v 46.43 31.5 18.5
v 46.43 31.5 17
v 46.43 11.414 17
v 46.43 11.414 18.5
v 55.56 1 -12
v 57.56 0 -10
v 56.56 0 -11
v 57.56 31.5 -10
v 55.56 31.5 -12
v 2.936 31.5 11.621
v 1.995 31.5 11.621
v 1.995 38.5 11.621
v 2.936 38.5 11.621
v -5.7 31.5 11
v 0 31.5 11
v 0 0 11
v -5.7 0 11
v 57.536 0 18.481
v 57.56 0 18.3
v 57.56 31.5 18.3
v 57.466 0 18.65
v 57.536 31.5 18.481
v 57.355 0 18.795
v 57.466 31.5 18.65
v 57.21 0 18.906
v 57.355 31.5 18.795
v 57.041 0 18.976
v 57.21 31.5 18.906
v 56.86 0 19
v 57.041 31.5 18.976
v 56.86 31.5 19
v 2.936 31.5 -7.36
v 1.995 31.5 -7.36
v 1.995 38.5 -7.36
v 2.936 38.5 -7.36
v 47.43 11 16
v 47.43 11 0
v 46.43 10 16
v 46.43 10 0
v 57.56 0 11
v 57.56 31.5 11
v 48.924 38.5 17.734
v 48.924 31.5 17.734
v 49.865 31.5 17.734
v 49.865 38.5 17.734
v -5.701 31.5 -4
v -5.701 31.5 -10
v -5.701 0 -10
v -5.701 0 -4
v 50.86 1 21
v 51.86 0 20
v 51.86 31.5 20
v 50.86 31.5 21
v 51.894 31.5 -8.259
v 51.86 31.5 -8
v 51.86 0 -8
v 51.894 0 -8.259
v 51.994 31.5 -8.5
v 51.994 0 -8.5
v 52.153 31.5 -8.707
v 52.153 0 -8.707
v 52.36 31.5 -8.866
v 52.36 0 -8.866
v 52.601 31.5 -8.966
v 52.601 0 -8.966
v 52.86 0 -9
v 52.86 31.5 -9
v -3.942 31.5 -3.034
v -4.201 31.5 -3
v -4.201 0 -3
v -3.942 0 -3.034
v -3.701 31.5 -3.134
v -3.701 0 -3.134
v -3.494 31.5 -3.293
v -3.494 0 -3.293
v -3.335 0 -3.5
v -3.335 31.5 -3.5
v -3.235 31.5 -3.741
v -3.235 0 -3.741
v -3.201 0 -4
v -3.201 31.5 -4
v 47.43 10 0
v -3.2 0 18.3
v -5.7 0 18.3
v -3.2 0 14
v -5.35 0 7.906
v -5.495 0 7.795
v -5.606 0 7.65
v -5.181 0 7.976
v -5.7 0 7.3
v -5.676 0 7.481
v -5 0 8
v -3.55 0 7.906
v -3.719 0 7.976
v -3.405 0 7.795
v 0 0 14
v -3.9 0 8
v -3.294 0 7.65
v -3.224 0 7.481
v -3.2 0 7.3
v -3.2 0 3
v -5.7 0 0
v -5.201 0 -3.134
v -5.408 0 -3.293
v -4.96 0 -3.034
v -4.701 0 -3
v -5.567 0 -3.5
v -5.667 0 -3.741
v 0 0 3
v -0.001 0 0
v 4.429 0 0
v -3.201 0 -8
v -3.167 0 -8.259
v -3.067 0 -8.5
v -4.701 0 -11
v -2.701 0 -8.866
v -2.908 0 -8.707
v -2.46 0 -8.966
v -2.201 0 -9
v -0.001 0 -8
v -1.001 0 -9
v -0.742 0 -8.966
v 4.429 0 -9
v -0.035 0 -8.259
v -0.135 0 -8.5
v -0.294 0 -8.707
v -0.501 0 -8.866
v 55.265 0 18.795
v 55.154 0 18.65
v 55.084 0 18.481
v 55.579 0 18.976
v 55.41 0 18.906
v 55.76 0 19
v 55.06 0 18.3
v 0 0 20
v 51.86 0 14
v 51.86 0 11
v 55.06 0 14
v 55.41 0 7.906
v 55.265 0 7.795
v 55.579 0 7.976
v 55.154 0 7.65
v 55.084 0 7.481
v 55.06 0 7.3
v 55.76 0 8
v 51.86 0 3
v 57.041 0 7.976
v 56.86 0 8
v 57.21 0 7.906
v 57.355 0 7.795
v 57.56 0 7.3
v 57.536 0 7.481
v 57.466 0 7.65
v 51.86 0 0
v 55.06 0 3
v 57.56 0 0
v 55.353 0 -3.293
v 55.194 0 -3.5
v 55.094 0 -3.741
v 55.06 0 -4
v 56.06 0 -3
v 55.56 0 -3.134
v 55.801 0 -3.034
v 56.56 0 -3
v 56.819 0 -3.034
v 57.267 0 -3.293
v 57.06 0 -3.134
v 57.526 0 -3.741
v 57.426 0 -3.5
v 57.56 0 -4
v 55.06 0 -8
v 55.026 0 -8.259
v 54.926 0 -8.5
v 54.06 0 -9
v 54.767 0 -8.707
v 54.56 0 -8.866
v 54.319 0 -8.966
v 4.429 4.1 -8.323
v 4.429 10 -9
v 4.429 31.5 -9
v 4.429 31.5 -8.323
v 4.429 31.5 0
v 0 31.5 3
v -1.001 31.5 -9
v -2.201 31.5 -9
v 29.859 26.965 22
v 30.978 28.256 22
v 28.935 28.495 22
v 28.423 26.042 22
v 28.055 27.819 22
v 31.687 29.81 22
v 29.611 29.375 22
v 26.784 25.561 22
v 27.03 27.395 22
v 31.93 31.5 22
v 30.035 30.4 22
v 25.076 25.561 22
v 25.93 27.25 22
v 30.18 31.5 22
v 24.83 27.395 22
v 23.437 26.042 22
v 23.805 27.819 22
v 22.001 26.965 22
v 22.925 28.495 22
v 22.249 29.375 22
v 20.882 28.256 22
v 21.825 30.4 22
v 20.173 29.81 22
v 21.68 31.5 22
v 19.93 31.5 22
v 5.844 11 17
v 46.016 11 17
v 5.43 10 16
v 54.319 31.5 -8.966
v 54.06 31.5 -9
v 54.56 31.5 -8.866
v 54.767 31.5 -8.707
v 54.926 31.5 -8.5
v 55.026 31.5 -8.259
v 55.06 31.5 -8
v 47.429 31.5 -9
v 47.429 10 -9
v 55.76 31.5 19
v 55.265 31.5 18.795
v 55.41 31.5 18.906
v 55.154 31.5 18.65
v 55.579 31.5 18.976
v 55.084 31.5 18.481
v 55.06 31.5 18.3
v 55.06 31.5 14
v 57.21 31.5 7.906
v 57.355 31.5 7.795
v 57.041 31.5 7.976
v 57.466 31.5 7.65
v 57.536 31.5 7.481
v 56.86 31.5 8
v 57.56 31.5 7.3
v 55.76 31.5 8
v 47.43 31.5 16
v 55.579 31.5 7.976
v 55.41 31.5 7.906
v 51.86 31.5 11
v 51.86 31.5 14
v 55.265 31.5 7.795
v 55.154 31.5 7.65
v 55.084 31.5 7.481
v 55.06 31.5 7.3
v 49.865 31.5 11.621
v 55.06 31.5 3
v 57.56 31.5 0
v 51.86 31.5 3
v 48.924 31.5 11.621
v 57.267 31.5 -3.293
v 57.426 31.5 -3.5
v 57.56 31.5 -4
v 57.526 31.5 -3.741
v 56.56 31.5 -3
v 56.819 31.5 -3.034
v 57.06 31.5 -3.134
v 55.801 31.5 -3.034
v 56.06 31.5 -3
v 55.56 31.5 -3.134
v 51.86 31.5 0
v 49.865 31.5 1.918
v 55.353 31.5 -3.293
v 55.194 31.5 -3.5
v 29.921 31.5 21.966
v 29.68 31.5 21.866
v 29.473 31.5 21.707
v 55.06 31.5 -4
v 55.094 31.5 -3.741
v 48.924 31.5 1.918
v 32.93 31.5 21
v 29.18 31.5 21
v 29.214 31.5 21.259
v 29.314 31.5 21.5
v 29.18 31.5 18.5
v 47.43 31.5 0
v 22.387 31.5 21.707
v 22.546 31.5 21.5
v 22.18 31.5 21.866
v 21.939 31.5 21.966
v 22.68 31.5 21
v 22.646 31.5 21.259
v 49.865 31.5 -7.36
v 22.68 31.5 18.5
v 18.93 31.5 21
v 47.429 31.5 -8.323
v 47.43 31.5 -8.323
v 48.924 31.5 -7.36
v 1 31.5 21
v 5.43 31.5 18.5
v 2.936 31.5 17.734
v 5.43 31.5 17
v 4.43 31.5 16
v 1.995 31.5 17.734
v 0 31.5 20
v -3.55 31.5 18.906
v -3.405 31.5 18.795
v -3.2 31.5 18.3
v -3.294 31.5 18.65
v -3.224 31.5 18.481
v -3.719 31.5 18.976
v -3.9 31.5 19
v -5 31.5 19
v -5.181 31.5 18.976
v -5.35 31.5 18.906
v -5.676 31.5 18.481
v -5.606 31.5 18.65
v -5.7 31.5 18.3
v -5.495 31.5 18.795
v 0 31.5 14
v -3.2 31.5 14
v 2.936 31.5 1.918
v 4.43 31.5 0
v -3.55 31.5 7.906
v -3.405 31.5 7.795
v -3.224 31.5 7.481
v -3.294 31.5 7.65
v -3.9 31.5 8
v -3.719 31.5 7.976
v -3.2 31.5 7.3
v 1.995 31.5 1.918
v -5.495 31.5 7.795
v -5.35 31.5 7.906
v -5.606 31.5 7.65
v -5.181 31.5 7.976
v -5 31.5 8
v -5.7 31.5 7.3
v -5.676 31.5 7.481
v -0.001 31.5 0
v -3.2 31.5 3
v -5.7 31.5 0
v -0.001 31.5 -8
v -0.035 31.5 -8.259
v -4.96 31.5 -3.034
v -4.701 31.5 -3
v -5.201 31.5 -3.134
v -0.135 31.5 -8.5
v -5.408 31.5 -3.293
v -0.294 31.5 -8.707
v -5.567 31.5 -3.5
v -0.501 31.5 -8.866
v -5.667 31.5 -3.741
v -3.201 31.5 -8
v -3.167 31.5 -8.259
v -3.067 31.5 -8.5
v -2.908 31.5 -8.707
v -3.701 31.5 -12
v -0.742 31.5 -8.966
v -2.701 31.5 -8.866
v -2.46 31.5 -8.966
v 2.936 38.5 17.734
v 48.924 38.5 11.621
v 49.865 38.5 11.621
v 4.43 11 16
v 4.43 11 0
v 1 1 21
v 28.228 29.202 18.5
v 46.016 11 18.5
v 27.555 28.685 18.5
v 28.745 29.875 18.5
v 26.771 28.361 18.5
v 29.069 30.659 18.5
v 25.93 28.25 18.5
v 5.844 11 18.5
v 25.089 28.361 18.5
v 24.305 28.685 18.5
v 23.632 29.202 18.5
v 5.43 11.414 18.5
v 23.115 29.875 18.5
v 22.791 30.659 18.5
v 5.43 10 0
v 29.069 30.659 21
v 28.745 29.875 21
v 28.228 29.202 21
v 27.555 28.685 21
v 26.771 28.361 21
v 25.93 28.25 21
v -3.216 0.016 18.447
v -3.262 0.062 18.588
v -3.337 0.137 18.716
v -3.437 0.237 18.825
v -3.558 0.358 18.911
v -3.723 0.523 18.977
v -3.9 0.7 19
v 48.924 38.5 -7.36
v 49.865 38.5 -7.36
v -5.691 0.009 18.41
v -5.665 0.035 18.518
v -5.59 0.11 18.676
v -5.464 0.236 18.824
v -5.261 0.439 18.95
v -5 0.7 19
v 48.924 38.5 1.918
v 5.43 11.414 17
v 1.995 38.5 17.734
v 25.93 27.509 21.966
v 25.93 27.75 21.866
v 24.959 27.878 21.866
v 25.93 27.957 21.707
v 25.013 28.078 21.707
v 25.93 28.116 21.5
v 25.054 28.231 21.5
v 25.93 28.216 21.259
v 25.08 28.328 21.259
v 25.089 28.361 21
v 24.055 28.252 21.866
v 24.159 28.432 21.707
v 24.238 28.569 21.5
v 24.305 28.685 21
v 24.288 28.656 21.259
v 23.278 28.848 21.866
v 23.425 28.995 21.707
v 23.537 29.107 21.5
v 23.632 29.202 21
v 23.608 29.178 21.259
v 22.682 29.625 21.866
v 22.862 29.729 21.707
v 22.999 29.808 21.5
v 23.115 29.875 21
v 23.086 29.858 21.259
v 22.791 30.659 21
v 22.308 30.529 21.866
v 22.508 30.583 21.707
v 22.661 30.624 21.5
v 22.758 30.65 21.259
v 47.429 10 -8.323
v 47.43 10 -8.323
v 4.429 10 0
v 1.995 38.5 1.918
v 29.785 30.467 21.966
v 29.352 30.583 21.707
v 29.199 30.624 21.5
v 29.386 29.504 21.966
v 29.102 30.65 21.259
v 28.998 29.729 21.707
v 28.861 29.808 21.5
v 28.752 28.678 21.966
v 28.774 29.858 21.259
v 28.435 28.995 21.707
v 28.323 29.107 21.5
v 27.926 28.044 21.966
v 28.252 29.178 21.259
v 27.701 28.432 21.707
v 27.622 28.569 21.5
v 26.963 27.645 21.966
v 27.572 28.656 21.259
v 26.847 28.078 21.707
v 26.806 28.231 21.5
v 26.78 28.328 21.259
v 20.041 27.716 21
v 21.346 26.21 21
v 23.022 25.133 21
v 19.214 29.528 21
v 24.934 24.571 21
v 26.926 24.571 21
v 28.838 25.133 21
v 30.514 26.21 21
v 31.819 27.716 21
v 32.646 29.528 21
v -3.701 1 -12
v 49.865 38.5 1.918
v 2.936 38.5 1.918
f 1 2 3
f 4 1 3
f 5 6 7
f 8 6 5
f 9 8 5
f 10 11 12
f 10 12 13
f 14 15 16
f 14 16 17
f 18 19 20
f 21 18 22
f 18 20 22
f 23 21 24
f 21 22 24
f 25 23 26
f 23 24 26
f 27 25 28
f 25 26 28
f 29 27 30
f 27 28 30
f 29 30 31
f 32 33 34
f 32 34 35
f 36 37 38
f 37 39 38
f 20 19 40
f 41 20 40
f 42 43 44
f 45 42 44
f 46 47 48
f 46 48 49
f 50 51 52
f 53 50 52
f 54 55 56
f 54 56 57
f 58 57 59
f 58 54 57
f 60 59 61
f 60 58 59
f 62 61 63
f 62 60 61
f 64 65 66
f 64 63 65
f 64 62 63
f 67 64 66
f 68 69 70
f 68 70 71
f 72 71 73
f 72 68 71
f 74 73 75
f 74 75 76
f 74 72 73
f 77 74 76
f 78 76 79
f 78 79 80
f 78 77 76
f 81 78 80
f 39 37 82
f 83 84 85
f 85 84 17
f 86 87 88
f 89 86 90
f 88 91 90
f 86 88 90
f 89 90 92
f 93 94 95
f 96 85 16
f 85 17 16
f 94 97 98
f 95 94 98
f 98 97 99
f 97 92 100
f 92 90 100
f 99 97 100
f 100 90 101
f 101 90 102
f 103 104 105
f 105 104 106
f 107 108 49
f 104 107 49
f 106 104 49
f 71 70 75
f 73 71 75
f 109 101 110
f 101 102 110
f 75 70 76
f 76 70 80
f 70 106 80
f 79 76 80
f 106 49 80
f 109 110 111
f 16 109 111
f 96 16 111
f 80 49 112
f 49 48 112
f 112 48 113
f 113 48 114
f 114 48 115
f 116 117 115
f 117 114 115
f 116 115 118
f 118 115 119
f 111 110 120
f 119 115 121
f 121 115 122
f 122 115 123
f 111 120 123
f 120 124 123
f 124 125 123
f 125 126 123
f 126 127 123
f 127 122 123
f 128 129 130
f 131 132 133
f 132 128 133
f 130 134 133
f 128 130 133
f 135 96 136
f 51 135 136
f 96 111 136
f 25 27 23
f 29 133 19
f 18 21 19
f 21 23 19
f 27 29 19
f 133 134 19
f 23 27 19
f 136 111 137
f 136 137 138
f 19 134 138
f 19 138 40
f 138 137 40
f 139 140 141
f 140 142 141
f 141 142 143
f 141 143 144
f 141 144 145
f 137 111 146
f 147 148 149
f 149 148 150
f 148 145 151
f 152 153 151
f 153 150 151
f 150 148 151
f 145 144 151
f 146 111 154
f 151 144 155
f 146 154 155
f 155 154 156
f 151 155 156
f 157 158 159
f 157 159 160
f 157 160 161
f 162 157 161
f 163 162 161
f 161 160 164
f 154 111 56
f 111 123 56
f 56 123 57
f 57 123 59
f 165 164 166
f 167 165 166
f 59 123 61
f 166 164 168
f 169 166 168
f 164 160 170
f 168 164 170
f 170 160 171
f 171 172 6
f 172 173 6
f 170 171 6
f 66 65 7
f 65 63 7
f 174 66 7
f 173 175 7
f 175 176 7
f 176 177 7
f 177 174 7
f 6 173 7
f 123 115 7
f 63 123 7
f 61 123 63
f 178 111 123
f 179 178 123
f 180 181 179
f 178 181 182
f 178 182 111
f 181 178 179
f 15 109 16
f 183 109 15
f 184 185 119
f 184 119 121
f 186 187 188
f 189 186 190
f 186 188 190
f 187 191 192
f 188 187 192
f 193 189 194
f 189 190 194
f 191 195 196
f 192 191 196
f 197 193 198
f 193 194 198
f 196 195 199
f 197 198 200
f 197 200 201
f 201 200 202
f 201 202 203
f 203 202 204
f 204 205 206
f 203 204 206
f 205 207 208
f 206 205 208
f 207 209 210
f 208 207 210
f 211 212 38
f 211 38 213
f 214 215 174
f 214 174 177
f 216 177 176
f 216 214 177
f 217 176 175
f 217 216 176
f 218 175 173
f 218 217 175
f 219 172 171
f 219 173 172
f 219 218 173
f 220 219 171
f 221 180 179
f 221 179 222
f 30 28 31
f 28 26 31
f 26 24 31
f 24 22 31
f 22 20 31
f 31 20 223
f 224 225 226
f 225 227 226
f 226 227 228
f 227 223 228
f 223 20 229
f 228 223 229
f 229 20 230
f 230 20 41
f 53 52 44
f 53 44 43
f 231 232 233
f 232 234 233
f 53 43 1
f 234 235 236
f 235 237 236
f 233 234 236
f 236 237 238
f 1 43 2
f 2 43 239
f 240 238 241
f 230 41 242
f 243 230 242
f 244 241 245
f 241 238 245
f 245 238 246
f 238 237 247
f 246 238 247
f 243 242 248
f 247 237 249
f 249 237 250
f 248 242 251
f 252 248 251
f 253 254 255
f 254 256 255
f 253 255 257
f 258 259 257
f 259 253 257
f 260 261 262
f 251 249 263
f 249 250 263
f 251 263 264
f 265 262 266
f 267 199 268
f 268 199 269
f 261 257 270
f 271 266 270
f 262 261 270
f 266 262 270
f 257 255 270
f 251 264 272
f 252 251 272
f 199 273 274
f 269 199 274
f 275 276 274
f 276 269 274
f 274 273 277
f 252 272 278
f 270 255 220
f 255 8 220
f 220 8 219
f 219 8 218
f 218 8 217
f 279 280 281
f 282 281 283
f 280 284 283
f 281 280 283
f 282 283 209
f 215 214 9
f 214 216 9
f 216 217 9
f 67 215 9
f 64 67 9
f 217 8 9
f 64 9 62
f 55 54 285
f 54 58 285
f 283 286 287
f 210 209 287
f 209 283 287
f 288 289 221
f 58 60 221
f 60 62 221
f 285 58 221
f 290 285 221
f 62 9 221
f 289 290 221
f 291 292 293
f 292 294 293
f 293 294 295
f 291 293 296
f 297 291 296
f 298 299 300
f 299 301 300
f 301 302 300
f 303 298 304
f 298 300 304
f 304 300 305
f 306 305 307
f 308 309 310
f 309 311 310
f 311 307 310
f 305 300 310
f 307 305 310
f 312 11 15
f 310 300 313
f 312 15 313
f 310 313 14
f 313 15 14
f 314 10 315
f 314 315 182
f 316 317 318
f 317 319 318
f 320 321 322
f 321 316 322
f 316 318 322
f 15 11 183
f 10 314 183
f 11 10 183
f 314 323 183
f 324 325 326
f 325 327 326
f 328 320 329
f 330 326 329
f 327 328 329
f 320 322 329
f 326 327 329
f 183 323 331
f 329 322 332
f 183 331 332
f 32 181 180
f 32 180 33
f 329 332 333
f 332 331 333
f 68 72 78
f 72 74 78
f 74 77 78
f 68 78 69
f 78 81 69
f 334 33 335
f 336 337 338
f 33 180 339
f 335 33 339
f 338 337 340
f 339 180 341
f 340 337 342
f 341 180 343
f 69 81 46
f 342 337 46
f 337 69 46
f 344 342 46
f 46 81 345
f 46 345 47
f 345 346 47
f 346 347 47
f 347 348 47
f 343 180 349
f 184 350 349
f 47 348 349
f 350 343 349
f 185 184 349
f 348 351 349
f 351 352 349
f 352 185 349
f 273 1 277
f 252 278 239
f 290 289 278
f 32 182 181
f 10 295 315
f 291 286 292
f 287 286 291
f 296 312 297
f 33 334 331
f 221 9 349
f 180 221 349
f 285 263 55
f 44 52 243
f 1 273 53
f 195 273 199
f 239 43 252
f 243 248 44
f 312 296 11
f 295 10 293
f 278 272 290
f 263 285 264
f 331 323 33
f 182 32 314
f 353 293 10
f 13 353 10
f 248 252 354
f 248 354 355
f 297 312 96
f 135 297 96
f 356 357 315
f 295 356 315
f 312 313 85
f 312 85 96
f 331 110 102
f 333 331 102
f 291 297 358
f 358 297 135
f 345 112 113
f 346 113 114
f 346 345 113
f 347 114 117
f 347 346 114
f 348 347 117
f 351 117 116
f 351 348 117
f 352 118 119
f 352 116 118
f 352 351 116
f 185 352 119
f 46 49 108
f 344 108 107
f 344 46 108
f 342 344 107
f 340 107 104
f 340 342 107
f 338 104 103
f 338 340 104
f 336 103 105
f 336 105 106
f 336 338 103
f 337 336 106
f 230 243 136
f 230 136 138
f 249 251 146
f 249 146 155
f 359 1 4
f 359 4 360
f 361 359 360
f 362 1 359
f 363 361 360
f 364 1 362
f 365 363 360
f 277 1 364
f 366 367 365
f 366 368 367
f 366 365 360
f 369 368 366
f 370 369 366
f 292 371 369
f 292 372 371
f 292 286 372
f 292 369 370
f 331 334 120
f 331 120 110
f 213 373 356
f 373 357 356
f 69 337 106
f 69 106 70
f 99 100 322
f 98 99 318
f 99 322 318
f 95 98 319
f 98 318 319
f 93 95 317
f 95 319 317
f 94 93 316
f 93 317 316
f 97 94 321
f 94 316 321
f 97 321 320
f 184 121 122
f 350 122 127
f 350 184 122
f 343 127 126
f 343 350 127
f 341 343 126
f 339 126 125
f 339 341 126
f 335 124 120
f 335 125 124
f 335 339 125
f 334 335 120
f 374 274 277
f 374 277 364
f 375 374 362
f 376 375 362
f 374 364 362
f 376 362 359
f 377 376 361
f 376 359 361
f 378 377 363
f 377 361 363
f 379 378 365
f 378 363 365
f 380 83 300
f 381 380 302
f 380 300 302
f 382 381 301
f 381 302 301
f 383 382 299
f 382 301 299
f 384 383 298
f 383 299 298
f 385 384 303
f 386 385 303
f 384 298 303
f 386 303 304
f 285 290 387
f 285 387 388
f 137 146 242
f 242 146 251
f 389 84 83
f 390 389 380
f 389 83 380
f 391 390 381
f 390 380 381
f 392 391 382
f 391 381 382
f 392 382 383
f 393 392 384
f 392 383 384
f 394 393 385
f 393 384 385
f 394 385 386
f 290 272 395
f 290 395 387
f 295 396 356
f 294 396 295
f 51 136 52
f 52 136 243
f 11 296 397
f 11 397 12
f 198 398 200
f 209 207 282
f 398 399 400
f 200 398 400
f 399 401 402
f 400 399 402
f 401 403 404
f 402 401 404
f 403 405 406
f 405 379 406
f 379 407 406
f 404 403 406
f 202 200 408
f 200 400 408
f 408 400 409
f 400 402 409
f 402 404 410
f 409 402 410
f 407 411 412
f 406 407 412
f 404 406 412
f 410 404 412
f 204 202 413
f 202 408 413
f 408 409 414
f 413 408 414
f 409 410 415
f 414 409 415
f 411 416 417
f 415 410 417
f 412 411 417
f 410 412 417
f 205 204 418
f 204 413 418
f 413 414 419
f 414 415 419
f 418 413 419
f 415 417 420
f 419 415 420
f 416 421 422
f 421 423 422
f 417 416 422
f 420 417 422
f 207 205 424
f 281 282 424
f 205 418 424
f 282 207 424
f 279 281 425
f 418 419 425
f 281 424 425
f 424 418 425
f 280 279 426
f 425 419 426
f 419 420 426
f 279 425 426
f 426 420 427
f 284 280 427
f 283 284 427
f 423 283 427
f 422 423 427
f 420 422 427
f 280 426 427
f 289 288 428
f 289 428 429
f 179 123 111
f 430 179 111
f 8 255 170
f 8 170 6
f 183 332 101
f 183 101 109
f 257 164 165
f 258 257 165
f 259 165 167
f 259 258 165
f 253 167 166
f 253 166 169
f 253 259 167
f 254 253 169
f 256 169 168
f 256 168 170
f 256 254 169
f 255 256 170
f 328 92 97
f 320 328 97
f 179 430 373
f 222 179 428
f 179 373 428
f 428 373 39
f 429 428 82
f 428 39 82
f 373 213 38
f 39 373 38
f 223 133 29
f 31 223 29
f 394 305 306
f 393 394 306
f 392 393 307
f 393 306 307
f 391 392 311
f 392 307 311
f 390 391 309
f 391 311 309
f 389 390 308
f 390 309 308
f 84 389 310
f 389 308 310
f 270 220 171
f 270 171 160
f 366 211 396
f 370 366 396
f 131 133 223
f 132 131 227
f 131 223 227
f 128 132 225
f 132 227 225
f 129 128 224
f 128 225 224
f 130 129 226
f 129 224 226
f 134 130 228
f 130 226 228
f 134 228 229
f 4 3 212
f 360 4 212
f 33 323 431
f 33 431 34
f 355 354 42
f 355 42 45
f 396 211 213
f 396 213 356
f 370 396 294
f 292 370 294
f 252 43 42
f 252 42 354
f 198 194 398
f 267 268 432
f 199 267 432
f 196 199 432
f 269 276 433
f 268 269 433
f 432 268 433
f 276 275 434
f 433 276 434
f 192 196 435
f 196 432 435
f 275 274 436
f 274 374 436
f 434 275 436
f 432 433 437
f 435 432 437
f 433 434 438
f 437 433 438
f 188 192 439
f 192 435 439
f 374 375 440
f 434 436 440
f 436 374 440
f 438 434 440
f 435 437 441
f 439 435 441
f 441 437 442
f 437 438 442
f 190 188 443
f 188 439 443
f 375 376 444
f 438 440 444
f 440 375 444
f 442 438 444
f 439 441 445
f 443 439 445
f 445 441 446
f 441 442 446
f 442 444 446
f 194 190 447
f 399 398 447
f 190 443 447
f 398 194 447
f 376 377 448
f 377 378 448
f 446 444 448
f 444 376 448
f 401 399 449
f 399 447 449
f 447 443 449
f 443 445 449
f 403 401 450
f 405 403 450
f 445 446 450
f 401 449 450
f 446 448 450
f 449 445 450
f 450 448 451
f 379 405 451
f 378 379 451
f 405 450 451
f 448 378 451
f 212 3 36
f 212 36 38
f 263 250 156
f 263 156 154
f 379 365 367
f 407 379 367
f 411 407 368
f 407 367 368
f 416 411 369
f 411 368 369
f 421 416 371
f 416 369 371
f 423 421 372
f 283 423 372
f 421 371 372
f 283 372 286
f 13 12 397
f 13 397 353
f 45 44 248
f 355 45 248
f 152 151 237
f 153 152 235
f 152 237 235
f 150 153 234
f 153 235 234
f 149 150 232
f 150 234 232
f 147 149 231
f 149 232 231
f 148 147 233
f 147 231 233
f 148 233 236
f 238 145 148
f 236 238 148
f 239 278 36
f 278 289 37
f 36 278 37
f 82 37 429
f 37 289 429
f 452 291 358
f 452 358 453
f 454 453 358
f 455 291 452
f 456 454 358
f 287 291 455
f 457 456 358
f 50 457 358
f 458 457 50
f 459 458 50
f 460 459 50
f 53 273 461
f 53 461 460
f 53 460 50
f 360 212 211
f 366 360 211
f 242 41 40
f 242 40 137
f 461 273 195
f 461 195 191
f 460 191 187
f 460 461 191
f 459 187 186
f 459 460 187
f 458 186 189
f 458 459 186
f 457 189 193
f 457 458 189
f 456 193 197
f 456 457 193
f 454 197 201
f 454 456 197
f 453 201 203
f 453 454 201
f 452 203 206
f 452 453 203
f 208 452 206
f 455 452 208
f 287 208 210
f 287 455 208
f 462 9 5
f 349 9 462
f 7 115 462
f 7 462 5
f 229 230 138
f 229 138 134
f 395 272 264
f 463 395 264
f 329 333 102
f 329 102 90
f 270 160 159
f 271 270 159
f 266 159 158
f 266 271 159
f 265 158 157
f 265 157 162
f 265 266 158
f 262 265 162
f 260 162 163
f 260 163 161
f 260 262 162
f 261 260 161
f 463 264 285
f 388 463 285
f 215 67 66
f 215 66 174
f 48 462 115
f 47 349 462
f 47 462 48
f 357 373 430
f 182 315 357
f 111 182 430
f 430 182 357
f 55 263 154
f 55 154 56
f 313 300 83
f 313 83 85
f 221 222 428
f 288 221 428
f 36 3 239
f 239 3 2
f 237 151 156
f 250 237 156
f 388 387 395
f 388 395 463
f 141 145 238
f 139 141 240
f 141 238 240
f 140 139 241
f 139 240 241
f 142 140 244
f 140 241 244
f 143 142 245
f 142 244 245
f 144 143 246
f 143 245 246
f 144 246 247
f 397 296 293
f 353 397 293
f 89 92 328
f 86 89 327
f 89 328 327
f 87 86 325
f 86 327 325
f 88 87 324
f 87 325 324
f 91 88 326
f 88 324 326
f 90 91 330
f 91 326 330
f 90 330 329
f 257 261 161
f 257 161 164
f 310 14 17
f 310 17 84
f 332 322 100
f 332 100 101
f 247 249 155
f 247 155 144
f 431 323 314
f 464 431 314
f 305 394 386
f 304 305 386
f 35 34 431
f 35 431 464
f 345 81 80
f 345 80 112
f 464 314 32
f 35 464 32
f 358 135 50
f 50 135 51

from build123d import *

# Parameters (mm, degrees)
ESQUISSE1_W              = 51.86
ESQUISSE1_H              = 63
BOSS_EXTRU_1_DEPTH       = 20
ENL_V_MAT_EXTRU_1_DEPTH  = 18
ESQUISSE3_W              = 8.7
ESQUISSE3_H              = 3
BOSS_EXTRU_2_DEPTH       = 7
ESQUISSE4_W              = 43
ESQUISSE4_H              = 43
BOSS_EXTRU_3_DEPTH       = 1
CHANFREIN1_SIZE          = 1
ESQUISSE6_R              = 7
BOSS_EXTRU_4_DEPTH       = 5
ENL_V_MAT_EXTRU_2_DEPTH  = 10
BOSS_EXTRU_5_DEPTH       = 63
ESQUISSE9_W              = 2.5
ESQUISSE9_H              = 1
ENL_V_MAT_EXTRU_3_DEPTH  = 63
CHANFREIN3_SIZE          = 1
CONG_1_R                 = 1
CONG_2_R                 = 1
CONG_5_R                 = 0.7
ENL_V_MAT_EXTRU_11_DEPTH = 1.5
ESQUISSE24_W             = 38.565319184
ESQUISSE24_H             = 34.907409987
ENL_V_MAT_EXTRU_16_DEPTH = 74
BOSS_EXTRU_11_REACH      = 71.206
ESQUISSE26_W             = 43.000682915
ESQUISSE26_H             = 8.323167201
ENL_V_MAT_EXTRU_17_DEPTH = 74
ESQUISSE27_W             = 43.00063515
ESQUISSE27_H             = 9
BOSS_EXTRU_12_DEPTH      = 10
BOSS_EXTRU_13_DEPTH      = 1
CHANFREIN4_SIZE          = 1
CHANFREIN5_SIZE          = 1
ESQUISSE29_W             = 0.940494366
ESQUISSE29_H             = 6.11321338
ESQUISSE29_H_2           = 9.278042655
BOSS_EXTRU_14_DEPTH      = 7


with BuildPart() as part:
    # Esquisse1 → Boss.-Extru.1 (new body)
    with BuildSketch(Plane.XY):
        with Locations((25.93, 31.5)):
            Rectangle(ESQUISSE1_W, ESQUISSE1_H)
    extrude(amount=BOSS_EXTRU_1_DEPTH)

    # Esquisse2 → Enlèv. mat.-Extru.1 (cut)
    with BuildSketch(Plane(origin=(0, 0, 0), x_dir=(-1, 0, 0), z_dir=(0, 0, -1))):
        Polygon((-8.231746032, 10), (-43.628253968, 53), (-47.43, 53), (-47.43, 10), align=None)
        Polygon((-4.43, 53), (-43.628253968, 53), (-8.231746032, 10), (-4.43, 10), align=None)
    extrude(amount=-ENL_V_MAT_EXTRU_1_DEPTH, mode=Mode.SUBTRACT)

    # Esquisse3 → Boss.-Extru.2 (add)
    with BuildSketch(Plane(origin=(0, 0, 0), x_dir=(-1, 0, 0), z_dir=(0, 0, -1))):
        with Locations((-8.88, 57.4)):
            Rectangle(ESQUISSE3_W, ESQUISSE3_H)
        with Locations((-42.98, 57.4)):
            Rectangle(ESQUISSE3_W, ESQUISSE3_H)
        with Locations((-42.98, 5.6)):
            Rectangle(ESQUISSE3_W, ESQUISSE3_H)
        with Locations((-8.88, 5.6)):
            Rectangle(ESQUISSE3_W, ESQUISSE3_H)
    extrude(amount=BOSS_EXTRU_2_DEPTH)

    # Esquisse4 → Boss.-Extru.3 (add)
    with BuildSketch(Plane(origin=(0, 0, 18), x_dir=(-1, 0, 0), z_dir=(0, 0, -1))):
        with Locations((-25.93, 31.5)):
            Rectangle(ESQUISSE4_W, ESQUISSE4_H)
    extrude(amount=BOSS_EXTRU_3_DEPTH)

    # Chanfrein1
    chanfrein1_edges = [part.edges().sort_by_distance(p)[0] for p in [
        (47.43, 10, 8.5),
        (47.43, 53, 8.5),
        (4.43, 10, 8.5),
        (4.43, 53, 8.5),
    ]]
    chamfer(chanfrein1_edges, length=CHANFREIN1_SIZE)

    # Esquisse6 → Boss.-Extru.4 (add)
    with BuildSketch(Plane(origin=(0, 0, 17), x_dir=(-1, 0, 0), z_dir=(0, 0, -1))):
        with Locations((-25.93, 31.5)):
            Circle(ESQUISSE6_R)
    extrude(amount=-BOSS_EXTRU_4_DEPTH)

    # Esquisse7 → Enlèv. mat.-Extru.2 (cut)
    with BuildSketch(Plane(origin=(0, 0, 17), x_dir=(-1, 0, 0), z_dir=(0, 0, -1))):
        with BuildLine():
            ThreePointArc((-22.68, 31.5), (-23.631902961, 33.798097039), (-25.93, 34.75))
            Line((-25.93, 34.75), (-25.93, 28.25))
            ThreePointArc((-25.93, 28.25), (-23.631902961, 29.201902961), (-22.68, 31.5))
        make_face()
        with BuildLine():
            Line((-25.93, 28.25), (-25.93, 34.75))
            ThreePointArc((-25.93, 34.75), (-29.18, 31.5), (-25.93, 28.25))
        make_face()
    extrude(amount=-ENL_V_MAT_EXTRU_2_DEPTH, mode=Mode.SUBTRACT)

    # Esquisse8 → Boss.-Extru.5 (add)
    with BuildSketch(Plane(origin=(0, 63, 0), x_dir=(1, 0, 0), z_dir=(0, 1, 0))):
        Polygon((55.06, -3), (55.06, -9), (57.56, -9), (57.56, 0), (51.86, 0), (51.86, -3), align=None)
        Polygon((57.56, -11), (51.86, -11), (51.86, -14), (55.06, -14), (55.06, -20), (57.56, -20), align=None)
        Polygon((0, -3), (0, 0), (-5.7, 0), (-5.7, -9), (-3.2, -9), (-3.2, -3), align=None)
        Polygon((0, -14), (0, -11), (-5.7, -11), (-5.7, -20), (-3.2, -20), (-3.2, -14), align=None)
    extrude(amount=-BOSS_EXTRU_5_DEPTH)

    # Esquisse9 → Enlèv. mat.-Extru.3 (cut)
    with BuildSketch(Plane.XZ):
        with Locations((-4.45, 8.5)):
            Rectangle(ESQUISSE9_W, ESQUISSE9_H)
        with Locations((-4.45, 19.5)):
            Rectangle(ESQUISSE9_W, ESQUISSE9_H)
        with Locations((56.31, 8.5)):
            Rectangle(ESQUISSE9_W, ESQUISSE9_H)
        with Locations((56.31, 19.5)):
            Rectangle(ESQUISSE9_W, ESQUISSE9_H)
    extrude(amount=-ENL_V_MAT_EXTRU_3_DEPTH, mode=Mode.SUBTRACT)

    # Chanfrein3
    chanfrein3_edges = [part.edges().sort_by_distance(p)[0] for p in [
        (46.93, 52.5, 17),
        (4.93, 52.5, 17),
        (46.93, 10.5, 17),
        (4.93, 10.5, 17),
        (25.93, 34.75, 17),
        (4.43, 31.5, 17),
        (25.93, 10, 17),
        (47.43, 31.5, 17),
        (25.93, 53, 17),
    ]]
    chamfer(chanfrein3_edges, length=CHANFREIN3_SIZE)

    # Congé1
    cong_1_edges = [part.edges().sort_by_distance(p)[0] for p in [
        (4.53, 57.4, -7),
        (8.88, 55.9, -7),
        (8.88, 58.9, -7),
        (13.23, 57.4, -7),
        (38.63, 57.4, -7),
        (42.98, 58.9, -7),
        (47.33, 57.4, -7),
        (42.98, 55.9, -7),
        (47.33, 5.6, -7),
        (42.98, 7.1, -7),
        (42.98, 4.1, -7),
        (38.63, 5.6, -7),
        (13.23, 5.6, -7),
        (8.88, 4.1, -7),
        (4.53, 5.6, -7),
        (8.88, 7.1, -7),
    ]]
    fillet(cong_1_edges, radius=CONG_1_R)

    # Congé2
    cong_2_edges = [part.edges().sort_by_distance(p)[0] for p in [
        (25.93, 34.75, 22),
    ]]
    fillet(cong_2_edges, radius=CONG_2_R)

    # Congé5
    cong_5_edges = [part.edges().sort_by_distance(p)[0] for p in [
        (-3.2, 31.5, 19),
        (-5.7, 31.5, 19),
        (-3.2, 31.5, 8),
        (-5.7, 31.5, 8),
        (55.06, 31.5, 8),
        (57.56, 31.5, 8),
        (55.06, 31.5, 19),
        (57.56, 31.5, 19),
        (-4.45, 0, 19),
        (-4.45, 63, 19),
    ]]
    fillet(cong_5_edges, radius=CONG_5_R)

    # Esquisse19 → Enlèv. mat.-Extru.11 (cut)
    with BuildSketch(Plane(origin=(0, 0, 17), x_dir=(-1, 0, 0), z_dir=(0, 0, -1))):
        Polygon((-46.43, 11.414213562), (-46.015786438, 11), (-5.844213562, 11), (-5.43, 11.414213562), (-5.43, 51.585786438), (-5.844213562, 52), (-46.015786438, 52), (-46.43, 51.585786438), align=None)
    extrude(amount=-ENL_V_MAT_EXTRU_11_DEPTH, mode=Mode.SUBTRACT)

    # Esquisse24 → Enlèv. mat.-Extru.16 (cut)
    with BuildSketch(Plane(origin=(57.56, 0, 0), x_dir=(0, 0, -1), z_dir=(1, 0, 0))):
        with Locations((-11.348740569, 48.953704994)):
            Rectangle(ESQUISSE24_W, ESQUISSE24_H)
    extrude(amount=-ENL_V_MAT_EXTRU_16_DEPTH, mode=Mode.SUBTRACT)

    # Boss.-Extru.11: up to this face of the body (flat: up to its plane)
    boss_extru_11_end = Plane(part.part.faces().sort_by_distance((25.97056106, 0, 9.851467598))[0])
    # Esquisse25 → Boss.-Extru.11 (add, up to the picked face)
    with BuildSketch(Plane(origin=(0, 31.5, 0), x_dir=(1, 0, 0), z_dir=(0, 1, 0)), mode=Mode.PRIVATE) as boss_extru_11_sk1:
        with BuildLine():
            Line((47.42936485, 9), (47.43, 0))
            Line((47.43, 0), (51.86, 0))
            Line((51.86, 0), (51.86, 8))
            ThreePointArc((51.86, 8), (52.152893219, 8.707106781), (52.86, 9))
            Line((52.86, 9), (54.06, 9))
            ThreePointArc((54.06, 9), (54.767106781, 8.707106781), (55.06, 8))
            Line((55.06, 8), (55.06, 4))
            ThreePointArc((55.06, 4), (55.352893219, 3.292893219), (56.06, 3))
            Line((56.06, 3), (56.56, 3))
            ThreePointArc((56.56, 3), (57.267106781, 3.292893219), (57.56, 4))
            Line((57.56, 4), (57.56, 10))
            Line((57.56, 10), (55.56, 12))
            Line((55.56, 12), (25.92936485, 12))
            Line((25.92936485, 12), (25.92936485, 9))
            Line((25.92936485, 9), (47.42936485, 9))
        make_face()
    boss_extru_11_tool1 = split(extrude(boss_extru_11_sk1.sketch, amount=-BOSS_EXTRU_11_REACH, mode=Mode.PRIVATE), bisect_by=boss_extru_11_end, keep=Keep.BOTH, mode=Mode.PRIVATE)
    # Esquisse25 → Boss.-Extru.11 (add, up to the picked face)
    with BuildSketch(Plane(origin=(0, 31.5, 0), x_dir=(1, 0, 0), z_dir=(0, 1, 0)), mode=Mode.PRIVATE) as boss_extru_11_sk2:
        with BuildLine():
            Line((4.42936485, 9), (25.92936485, 9))
            Line((25.92936485, 9), (25.92936485, 12))
            Line((25.92936485, 12), (-3.7012703, 12))
            Line((-3.7012703, 12), (-5.7012703, 10))
            Line((-5.7012703, 10), (-5.7012703, 4))
            ThreePointArc((-5.7012703, 4), (-5.408377081, 3.292893219), (-4.7012703, 3))
            Line((-4.7012703, 3), (-4.2012703, 3))
            ThreePointArc((-4.2012703, 3), (-3.494163519, 3.292893219), (-3.2012703, 4))
            Line((-3.2012703, 4), (-3.2012703, 8))
            ThreePointArc((-3.2012703, 8), (-2.908377081, 8.707106781), (-2.2012703, 9))
            Line((-2.2012703, 9), (-1.0012703, 9))
            ThreePointArc((-1.0012703, 9), (-0.294163519, 8.707106781), (-0.0012703, 8))
            Line((-0.0012703, 8), (-0.0012703, 0))
            Line((-0.0012703, 0), (4.4287297, 0))
            Line((4.4287297, 0), (4.42936485, 9))
        make_face()
    boss_extru_11_tool2 = split(extrude(boss_extru_11_sk2.sketch, amount=-BOSS_EXTRU_11_REACH, mode=Mode.PRIVATE), bisect_by=boss_extru_11_end, keep=Keep.BOTH, mode=Mode.PRIVATE)
    add(boss_extru_11_tool1.solids().sort_by(Axis((36.679365, 31.5, -9.338304), (0, -1, 0)))[0])
    add(boss_extru_11_tool2.solids().sort_by(Axis((15.179365, 31.5, -9.338304), (0, -1, 0)))[0])

    # Esquisse26 → Enlèv. mat.-Extru.17 (cut)
    with BuildSketch(Plane.XZ.offset(-4.1)):
        with Locations((25.929658543, -4.161583601)):
            Rectangle(ESQUISSE26_W, ESQUISSE26_H)
    extrude(amount=-ENL_V_MAT_EXTRU_17_DEPTH, mode=Mode.SUBTRACT)

    # Esquisse27 → Boss.-Extru.12 (add)
    with BuildSketch(Plane.XZ):
        with Locations((25.929682425, -4.5)):
            Rectangle(ESQUISSE27_W, ESQUISSE27_H)
    extrude(amount=-BOSS_EXTRU_12_DEPTH)

    # Esquisse28 → Boss.-Extru.13 (add)
    with BuildSketch(Plane.XY.offset(20)):
        with BuildLine():
            Line((51.86, 0), (51.86, 31.5))
            Line((51.86, 31.5), (32.93, 31.5))
            ThreePointArc((32.93, 31.5), (25.93, 24.5), (18.93, 31.5))
            Line((18.93, 31.5), (0, 31.5))
            Line((0, 31.5), (0, 0))
            Line((0, 0), (51.86, 0))
        make_face()
    extrude(amount=BOSS_EXTRU_13_DEPTH)

    # Chanfrein4
    chanfrein4_edges = [part.edges().sort_by_distance(p)[0] for p in [
        (25.93, 24.5, 22),
    ]]
    chamfer(chanfrein4_edges, length=CHANFREIN4_SIZE - 0.0001)  # a hair under: the kernel refuses the full size

    # Chanfrein5
    chanfrein5_edges = [part.edges().sort_by_distance(p)[0] for p in [
        (25.92936485, 0, -12),
        (25.93, 0, 21),
        (51.86, 15.75, 21),
        (0, 15.75, 21),
    ]]
    chamfer(chanfrein5_edges, length=CHANFREIN5_SIZE)

    # Esquisse29 → Boss.-Extru.14 (add)
    with BuildSketch(Plane(origin=(0, 31.5, 0), x_dir=(1, 0, 0), z_dir=(0, 1, 0))):
        with Locations((2.465352228, -14.677342748)):
            Rectangle(ESQUISSE29_W, ESQUISSE29_H)
        with Locations((2.465352228, 2.720621555)):
            Rectangle(ESQUISSE29_W, ESQUISSE29_H_2)
        with Locations((49.394647772, 2.720621555)):
            Rectangle(ESQUISSE29_W, ESQUISSE29_H_2)
        with Locations((49.394647772, -14.677342748)):
            Rectangle(ESQUISSE29_W, ESQUISSE29_H)
    extrude(amount=BOSS_EXTRU_14_DEPTH)


solid = part.part
